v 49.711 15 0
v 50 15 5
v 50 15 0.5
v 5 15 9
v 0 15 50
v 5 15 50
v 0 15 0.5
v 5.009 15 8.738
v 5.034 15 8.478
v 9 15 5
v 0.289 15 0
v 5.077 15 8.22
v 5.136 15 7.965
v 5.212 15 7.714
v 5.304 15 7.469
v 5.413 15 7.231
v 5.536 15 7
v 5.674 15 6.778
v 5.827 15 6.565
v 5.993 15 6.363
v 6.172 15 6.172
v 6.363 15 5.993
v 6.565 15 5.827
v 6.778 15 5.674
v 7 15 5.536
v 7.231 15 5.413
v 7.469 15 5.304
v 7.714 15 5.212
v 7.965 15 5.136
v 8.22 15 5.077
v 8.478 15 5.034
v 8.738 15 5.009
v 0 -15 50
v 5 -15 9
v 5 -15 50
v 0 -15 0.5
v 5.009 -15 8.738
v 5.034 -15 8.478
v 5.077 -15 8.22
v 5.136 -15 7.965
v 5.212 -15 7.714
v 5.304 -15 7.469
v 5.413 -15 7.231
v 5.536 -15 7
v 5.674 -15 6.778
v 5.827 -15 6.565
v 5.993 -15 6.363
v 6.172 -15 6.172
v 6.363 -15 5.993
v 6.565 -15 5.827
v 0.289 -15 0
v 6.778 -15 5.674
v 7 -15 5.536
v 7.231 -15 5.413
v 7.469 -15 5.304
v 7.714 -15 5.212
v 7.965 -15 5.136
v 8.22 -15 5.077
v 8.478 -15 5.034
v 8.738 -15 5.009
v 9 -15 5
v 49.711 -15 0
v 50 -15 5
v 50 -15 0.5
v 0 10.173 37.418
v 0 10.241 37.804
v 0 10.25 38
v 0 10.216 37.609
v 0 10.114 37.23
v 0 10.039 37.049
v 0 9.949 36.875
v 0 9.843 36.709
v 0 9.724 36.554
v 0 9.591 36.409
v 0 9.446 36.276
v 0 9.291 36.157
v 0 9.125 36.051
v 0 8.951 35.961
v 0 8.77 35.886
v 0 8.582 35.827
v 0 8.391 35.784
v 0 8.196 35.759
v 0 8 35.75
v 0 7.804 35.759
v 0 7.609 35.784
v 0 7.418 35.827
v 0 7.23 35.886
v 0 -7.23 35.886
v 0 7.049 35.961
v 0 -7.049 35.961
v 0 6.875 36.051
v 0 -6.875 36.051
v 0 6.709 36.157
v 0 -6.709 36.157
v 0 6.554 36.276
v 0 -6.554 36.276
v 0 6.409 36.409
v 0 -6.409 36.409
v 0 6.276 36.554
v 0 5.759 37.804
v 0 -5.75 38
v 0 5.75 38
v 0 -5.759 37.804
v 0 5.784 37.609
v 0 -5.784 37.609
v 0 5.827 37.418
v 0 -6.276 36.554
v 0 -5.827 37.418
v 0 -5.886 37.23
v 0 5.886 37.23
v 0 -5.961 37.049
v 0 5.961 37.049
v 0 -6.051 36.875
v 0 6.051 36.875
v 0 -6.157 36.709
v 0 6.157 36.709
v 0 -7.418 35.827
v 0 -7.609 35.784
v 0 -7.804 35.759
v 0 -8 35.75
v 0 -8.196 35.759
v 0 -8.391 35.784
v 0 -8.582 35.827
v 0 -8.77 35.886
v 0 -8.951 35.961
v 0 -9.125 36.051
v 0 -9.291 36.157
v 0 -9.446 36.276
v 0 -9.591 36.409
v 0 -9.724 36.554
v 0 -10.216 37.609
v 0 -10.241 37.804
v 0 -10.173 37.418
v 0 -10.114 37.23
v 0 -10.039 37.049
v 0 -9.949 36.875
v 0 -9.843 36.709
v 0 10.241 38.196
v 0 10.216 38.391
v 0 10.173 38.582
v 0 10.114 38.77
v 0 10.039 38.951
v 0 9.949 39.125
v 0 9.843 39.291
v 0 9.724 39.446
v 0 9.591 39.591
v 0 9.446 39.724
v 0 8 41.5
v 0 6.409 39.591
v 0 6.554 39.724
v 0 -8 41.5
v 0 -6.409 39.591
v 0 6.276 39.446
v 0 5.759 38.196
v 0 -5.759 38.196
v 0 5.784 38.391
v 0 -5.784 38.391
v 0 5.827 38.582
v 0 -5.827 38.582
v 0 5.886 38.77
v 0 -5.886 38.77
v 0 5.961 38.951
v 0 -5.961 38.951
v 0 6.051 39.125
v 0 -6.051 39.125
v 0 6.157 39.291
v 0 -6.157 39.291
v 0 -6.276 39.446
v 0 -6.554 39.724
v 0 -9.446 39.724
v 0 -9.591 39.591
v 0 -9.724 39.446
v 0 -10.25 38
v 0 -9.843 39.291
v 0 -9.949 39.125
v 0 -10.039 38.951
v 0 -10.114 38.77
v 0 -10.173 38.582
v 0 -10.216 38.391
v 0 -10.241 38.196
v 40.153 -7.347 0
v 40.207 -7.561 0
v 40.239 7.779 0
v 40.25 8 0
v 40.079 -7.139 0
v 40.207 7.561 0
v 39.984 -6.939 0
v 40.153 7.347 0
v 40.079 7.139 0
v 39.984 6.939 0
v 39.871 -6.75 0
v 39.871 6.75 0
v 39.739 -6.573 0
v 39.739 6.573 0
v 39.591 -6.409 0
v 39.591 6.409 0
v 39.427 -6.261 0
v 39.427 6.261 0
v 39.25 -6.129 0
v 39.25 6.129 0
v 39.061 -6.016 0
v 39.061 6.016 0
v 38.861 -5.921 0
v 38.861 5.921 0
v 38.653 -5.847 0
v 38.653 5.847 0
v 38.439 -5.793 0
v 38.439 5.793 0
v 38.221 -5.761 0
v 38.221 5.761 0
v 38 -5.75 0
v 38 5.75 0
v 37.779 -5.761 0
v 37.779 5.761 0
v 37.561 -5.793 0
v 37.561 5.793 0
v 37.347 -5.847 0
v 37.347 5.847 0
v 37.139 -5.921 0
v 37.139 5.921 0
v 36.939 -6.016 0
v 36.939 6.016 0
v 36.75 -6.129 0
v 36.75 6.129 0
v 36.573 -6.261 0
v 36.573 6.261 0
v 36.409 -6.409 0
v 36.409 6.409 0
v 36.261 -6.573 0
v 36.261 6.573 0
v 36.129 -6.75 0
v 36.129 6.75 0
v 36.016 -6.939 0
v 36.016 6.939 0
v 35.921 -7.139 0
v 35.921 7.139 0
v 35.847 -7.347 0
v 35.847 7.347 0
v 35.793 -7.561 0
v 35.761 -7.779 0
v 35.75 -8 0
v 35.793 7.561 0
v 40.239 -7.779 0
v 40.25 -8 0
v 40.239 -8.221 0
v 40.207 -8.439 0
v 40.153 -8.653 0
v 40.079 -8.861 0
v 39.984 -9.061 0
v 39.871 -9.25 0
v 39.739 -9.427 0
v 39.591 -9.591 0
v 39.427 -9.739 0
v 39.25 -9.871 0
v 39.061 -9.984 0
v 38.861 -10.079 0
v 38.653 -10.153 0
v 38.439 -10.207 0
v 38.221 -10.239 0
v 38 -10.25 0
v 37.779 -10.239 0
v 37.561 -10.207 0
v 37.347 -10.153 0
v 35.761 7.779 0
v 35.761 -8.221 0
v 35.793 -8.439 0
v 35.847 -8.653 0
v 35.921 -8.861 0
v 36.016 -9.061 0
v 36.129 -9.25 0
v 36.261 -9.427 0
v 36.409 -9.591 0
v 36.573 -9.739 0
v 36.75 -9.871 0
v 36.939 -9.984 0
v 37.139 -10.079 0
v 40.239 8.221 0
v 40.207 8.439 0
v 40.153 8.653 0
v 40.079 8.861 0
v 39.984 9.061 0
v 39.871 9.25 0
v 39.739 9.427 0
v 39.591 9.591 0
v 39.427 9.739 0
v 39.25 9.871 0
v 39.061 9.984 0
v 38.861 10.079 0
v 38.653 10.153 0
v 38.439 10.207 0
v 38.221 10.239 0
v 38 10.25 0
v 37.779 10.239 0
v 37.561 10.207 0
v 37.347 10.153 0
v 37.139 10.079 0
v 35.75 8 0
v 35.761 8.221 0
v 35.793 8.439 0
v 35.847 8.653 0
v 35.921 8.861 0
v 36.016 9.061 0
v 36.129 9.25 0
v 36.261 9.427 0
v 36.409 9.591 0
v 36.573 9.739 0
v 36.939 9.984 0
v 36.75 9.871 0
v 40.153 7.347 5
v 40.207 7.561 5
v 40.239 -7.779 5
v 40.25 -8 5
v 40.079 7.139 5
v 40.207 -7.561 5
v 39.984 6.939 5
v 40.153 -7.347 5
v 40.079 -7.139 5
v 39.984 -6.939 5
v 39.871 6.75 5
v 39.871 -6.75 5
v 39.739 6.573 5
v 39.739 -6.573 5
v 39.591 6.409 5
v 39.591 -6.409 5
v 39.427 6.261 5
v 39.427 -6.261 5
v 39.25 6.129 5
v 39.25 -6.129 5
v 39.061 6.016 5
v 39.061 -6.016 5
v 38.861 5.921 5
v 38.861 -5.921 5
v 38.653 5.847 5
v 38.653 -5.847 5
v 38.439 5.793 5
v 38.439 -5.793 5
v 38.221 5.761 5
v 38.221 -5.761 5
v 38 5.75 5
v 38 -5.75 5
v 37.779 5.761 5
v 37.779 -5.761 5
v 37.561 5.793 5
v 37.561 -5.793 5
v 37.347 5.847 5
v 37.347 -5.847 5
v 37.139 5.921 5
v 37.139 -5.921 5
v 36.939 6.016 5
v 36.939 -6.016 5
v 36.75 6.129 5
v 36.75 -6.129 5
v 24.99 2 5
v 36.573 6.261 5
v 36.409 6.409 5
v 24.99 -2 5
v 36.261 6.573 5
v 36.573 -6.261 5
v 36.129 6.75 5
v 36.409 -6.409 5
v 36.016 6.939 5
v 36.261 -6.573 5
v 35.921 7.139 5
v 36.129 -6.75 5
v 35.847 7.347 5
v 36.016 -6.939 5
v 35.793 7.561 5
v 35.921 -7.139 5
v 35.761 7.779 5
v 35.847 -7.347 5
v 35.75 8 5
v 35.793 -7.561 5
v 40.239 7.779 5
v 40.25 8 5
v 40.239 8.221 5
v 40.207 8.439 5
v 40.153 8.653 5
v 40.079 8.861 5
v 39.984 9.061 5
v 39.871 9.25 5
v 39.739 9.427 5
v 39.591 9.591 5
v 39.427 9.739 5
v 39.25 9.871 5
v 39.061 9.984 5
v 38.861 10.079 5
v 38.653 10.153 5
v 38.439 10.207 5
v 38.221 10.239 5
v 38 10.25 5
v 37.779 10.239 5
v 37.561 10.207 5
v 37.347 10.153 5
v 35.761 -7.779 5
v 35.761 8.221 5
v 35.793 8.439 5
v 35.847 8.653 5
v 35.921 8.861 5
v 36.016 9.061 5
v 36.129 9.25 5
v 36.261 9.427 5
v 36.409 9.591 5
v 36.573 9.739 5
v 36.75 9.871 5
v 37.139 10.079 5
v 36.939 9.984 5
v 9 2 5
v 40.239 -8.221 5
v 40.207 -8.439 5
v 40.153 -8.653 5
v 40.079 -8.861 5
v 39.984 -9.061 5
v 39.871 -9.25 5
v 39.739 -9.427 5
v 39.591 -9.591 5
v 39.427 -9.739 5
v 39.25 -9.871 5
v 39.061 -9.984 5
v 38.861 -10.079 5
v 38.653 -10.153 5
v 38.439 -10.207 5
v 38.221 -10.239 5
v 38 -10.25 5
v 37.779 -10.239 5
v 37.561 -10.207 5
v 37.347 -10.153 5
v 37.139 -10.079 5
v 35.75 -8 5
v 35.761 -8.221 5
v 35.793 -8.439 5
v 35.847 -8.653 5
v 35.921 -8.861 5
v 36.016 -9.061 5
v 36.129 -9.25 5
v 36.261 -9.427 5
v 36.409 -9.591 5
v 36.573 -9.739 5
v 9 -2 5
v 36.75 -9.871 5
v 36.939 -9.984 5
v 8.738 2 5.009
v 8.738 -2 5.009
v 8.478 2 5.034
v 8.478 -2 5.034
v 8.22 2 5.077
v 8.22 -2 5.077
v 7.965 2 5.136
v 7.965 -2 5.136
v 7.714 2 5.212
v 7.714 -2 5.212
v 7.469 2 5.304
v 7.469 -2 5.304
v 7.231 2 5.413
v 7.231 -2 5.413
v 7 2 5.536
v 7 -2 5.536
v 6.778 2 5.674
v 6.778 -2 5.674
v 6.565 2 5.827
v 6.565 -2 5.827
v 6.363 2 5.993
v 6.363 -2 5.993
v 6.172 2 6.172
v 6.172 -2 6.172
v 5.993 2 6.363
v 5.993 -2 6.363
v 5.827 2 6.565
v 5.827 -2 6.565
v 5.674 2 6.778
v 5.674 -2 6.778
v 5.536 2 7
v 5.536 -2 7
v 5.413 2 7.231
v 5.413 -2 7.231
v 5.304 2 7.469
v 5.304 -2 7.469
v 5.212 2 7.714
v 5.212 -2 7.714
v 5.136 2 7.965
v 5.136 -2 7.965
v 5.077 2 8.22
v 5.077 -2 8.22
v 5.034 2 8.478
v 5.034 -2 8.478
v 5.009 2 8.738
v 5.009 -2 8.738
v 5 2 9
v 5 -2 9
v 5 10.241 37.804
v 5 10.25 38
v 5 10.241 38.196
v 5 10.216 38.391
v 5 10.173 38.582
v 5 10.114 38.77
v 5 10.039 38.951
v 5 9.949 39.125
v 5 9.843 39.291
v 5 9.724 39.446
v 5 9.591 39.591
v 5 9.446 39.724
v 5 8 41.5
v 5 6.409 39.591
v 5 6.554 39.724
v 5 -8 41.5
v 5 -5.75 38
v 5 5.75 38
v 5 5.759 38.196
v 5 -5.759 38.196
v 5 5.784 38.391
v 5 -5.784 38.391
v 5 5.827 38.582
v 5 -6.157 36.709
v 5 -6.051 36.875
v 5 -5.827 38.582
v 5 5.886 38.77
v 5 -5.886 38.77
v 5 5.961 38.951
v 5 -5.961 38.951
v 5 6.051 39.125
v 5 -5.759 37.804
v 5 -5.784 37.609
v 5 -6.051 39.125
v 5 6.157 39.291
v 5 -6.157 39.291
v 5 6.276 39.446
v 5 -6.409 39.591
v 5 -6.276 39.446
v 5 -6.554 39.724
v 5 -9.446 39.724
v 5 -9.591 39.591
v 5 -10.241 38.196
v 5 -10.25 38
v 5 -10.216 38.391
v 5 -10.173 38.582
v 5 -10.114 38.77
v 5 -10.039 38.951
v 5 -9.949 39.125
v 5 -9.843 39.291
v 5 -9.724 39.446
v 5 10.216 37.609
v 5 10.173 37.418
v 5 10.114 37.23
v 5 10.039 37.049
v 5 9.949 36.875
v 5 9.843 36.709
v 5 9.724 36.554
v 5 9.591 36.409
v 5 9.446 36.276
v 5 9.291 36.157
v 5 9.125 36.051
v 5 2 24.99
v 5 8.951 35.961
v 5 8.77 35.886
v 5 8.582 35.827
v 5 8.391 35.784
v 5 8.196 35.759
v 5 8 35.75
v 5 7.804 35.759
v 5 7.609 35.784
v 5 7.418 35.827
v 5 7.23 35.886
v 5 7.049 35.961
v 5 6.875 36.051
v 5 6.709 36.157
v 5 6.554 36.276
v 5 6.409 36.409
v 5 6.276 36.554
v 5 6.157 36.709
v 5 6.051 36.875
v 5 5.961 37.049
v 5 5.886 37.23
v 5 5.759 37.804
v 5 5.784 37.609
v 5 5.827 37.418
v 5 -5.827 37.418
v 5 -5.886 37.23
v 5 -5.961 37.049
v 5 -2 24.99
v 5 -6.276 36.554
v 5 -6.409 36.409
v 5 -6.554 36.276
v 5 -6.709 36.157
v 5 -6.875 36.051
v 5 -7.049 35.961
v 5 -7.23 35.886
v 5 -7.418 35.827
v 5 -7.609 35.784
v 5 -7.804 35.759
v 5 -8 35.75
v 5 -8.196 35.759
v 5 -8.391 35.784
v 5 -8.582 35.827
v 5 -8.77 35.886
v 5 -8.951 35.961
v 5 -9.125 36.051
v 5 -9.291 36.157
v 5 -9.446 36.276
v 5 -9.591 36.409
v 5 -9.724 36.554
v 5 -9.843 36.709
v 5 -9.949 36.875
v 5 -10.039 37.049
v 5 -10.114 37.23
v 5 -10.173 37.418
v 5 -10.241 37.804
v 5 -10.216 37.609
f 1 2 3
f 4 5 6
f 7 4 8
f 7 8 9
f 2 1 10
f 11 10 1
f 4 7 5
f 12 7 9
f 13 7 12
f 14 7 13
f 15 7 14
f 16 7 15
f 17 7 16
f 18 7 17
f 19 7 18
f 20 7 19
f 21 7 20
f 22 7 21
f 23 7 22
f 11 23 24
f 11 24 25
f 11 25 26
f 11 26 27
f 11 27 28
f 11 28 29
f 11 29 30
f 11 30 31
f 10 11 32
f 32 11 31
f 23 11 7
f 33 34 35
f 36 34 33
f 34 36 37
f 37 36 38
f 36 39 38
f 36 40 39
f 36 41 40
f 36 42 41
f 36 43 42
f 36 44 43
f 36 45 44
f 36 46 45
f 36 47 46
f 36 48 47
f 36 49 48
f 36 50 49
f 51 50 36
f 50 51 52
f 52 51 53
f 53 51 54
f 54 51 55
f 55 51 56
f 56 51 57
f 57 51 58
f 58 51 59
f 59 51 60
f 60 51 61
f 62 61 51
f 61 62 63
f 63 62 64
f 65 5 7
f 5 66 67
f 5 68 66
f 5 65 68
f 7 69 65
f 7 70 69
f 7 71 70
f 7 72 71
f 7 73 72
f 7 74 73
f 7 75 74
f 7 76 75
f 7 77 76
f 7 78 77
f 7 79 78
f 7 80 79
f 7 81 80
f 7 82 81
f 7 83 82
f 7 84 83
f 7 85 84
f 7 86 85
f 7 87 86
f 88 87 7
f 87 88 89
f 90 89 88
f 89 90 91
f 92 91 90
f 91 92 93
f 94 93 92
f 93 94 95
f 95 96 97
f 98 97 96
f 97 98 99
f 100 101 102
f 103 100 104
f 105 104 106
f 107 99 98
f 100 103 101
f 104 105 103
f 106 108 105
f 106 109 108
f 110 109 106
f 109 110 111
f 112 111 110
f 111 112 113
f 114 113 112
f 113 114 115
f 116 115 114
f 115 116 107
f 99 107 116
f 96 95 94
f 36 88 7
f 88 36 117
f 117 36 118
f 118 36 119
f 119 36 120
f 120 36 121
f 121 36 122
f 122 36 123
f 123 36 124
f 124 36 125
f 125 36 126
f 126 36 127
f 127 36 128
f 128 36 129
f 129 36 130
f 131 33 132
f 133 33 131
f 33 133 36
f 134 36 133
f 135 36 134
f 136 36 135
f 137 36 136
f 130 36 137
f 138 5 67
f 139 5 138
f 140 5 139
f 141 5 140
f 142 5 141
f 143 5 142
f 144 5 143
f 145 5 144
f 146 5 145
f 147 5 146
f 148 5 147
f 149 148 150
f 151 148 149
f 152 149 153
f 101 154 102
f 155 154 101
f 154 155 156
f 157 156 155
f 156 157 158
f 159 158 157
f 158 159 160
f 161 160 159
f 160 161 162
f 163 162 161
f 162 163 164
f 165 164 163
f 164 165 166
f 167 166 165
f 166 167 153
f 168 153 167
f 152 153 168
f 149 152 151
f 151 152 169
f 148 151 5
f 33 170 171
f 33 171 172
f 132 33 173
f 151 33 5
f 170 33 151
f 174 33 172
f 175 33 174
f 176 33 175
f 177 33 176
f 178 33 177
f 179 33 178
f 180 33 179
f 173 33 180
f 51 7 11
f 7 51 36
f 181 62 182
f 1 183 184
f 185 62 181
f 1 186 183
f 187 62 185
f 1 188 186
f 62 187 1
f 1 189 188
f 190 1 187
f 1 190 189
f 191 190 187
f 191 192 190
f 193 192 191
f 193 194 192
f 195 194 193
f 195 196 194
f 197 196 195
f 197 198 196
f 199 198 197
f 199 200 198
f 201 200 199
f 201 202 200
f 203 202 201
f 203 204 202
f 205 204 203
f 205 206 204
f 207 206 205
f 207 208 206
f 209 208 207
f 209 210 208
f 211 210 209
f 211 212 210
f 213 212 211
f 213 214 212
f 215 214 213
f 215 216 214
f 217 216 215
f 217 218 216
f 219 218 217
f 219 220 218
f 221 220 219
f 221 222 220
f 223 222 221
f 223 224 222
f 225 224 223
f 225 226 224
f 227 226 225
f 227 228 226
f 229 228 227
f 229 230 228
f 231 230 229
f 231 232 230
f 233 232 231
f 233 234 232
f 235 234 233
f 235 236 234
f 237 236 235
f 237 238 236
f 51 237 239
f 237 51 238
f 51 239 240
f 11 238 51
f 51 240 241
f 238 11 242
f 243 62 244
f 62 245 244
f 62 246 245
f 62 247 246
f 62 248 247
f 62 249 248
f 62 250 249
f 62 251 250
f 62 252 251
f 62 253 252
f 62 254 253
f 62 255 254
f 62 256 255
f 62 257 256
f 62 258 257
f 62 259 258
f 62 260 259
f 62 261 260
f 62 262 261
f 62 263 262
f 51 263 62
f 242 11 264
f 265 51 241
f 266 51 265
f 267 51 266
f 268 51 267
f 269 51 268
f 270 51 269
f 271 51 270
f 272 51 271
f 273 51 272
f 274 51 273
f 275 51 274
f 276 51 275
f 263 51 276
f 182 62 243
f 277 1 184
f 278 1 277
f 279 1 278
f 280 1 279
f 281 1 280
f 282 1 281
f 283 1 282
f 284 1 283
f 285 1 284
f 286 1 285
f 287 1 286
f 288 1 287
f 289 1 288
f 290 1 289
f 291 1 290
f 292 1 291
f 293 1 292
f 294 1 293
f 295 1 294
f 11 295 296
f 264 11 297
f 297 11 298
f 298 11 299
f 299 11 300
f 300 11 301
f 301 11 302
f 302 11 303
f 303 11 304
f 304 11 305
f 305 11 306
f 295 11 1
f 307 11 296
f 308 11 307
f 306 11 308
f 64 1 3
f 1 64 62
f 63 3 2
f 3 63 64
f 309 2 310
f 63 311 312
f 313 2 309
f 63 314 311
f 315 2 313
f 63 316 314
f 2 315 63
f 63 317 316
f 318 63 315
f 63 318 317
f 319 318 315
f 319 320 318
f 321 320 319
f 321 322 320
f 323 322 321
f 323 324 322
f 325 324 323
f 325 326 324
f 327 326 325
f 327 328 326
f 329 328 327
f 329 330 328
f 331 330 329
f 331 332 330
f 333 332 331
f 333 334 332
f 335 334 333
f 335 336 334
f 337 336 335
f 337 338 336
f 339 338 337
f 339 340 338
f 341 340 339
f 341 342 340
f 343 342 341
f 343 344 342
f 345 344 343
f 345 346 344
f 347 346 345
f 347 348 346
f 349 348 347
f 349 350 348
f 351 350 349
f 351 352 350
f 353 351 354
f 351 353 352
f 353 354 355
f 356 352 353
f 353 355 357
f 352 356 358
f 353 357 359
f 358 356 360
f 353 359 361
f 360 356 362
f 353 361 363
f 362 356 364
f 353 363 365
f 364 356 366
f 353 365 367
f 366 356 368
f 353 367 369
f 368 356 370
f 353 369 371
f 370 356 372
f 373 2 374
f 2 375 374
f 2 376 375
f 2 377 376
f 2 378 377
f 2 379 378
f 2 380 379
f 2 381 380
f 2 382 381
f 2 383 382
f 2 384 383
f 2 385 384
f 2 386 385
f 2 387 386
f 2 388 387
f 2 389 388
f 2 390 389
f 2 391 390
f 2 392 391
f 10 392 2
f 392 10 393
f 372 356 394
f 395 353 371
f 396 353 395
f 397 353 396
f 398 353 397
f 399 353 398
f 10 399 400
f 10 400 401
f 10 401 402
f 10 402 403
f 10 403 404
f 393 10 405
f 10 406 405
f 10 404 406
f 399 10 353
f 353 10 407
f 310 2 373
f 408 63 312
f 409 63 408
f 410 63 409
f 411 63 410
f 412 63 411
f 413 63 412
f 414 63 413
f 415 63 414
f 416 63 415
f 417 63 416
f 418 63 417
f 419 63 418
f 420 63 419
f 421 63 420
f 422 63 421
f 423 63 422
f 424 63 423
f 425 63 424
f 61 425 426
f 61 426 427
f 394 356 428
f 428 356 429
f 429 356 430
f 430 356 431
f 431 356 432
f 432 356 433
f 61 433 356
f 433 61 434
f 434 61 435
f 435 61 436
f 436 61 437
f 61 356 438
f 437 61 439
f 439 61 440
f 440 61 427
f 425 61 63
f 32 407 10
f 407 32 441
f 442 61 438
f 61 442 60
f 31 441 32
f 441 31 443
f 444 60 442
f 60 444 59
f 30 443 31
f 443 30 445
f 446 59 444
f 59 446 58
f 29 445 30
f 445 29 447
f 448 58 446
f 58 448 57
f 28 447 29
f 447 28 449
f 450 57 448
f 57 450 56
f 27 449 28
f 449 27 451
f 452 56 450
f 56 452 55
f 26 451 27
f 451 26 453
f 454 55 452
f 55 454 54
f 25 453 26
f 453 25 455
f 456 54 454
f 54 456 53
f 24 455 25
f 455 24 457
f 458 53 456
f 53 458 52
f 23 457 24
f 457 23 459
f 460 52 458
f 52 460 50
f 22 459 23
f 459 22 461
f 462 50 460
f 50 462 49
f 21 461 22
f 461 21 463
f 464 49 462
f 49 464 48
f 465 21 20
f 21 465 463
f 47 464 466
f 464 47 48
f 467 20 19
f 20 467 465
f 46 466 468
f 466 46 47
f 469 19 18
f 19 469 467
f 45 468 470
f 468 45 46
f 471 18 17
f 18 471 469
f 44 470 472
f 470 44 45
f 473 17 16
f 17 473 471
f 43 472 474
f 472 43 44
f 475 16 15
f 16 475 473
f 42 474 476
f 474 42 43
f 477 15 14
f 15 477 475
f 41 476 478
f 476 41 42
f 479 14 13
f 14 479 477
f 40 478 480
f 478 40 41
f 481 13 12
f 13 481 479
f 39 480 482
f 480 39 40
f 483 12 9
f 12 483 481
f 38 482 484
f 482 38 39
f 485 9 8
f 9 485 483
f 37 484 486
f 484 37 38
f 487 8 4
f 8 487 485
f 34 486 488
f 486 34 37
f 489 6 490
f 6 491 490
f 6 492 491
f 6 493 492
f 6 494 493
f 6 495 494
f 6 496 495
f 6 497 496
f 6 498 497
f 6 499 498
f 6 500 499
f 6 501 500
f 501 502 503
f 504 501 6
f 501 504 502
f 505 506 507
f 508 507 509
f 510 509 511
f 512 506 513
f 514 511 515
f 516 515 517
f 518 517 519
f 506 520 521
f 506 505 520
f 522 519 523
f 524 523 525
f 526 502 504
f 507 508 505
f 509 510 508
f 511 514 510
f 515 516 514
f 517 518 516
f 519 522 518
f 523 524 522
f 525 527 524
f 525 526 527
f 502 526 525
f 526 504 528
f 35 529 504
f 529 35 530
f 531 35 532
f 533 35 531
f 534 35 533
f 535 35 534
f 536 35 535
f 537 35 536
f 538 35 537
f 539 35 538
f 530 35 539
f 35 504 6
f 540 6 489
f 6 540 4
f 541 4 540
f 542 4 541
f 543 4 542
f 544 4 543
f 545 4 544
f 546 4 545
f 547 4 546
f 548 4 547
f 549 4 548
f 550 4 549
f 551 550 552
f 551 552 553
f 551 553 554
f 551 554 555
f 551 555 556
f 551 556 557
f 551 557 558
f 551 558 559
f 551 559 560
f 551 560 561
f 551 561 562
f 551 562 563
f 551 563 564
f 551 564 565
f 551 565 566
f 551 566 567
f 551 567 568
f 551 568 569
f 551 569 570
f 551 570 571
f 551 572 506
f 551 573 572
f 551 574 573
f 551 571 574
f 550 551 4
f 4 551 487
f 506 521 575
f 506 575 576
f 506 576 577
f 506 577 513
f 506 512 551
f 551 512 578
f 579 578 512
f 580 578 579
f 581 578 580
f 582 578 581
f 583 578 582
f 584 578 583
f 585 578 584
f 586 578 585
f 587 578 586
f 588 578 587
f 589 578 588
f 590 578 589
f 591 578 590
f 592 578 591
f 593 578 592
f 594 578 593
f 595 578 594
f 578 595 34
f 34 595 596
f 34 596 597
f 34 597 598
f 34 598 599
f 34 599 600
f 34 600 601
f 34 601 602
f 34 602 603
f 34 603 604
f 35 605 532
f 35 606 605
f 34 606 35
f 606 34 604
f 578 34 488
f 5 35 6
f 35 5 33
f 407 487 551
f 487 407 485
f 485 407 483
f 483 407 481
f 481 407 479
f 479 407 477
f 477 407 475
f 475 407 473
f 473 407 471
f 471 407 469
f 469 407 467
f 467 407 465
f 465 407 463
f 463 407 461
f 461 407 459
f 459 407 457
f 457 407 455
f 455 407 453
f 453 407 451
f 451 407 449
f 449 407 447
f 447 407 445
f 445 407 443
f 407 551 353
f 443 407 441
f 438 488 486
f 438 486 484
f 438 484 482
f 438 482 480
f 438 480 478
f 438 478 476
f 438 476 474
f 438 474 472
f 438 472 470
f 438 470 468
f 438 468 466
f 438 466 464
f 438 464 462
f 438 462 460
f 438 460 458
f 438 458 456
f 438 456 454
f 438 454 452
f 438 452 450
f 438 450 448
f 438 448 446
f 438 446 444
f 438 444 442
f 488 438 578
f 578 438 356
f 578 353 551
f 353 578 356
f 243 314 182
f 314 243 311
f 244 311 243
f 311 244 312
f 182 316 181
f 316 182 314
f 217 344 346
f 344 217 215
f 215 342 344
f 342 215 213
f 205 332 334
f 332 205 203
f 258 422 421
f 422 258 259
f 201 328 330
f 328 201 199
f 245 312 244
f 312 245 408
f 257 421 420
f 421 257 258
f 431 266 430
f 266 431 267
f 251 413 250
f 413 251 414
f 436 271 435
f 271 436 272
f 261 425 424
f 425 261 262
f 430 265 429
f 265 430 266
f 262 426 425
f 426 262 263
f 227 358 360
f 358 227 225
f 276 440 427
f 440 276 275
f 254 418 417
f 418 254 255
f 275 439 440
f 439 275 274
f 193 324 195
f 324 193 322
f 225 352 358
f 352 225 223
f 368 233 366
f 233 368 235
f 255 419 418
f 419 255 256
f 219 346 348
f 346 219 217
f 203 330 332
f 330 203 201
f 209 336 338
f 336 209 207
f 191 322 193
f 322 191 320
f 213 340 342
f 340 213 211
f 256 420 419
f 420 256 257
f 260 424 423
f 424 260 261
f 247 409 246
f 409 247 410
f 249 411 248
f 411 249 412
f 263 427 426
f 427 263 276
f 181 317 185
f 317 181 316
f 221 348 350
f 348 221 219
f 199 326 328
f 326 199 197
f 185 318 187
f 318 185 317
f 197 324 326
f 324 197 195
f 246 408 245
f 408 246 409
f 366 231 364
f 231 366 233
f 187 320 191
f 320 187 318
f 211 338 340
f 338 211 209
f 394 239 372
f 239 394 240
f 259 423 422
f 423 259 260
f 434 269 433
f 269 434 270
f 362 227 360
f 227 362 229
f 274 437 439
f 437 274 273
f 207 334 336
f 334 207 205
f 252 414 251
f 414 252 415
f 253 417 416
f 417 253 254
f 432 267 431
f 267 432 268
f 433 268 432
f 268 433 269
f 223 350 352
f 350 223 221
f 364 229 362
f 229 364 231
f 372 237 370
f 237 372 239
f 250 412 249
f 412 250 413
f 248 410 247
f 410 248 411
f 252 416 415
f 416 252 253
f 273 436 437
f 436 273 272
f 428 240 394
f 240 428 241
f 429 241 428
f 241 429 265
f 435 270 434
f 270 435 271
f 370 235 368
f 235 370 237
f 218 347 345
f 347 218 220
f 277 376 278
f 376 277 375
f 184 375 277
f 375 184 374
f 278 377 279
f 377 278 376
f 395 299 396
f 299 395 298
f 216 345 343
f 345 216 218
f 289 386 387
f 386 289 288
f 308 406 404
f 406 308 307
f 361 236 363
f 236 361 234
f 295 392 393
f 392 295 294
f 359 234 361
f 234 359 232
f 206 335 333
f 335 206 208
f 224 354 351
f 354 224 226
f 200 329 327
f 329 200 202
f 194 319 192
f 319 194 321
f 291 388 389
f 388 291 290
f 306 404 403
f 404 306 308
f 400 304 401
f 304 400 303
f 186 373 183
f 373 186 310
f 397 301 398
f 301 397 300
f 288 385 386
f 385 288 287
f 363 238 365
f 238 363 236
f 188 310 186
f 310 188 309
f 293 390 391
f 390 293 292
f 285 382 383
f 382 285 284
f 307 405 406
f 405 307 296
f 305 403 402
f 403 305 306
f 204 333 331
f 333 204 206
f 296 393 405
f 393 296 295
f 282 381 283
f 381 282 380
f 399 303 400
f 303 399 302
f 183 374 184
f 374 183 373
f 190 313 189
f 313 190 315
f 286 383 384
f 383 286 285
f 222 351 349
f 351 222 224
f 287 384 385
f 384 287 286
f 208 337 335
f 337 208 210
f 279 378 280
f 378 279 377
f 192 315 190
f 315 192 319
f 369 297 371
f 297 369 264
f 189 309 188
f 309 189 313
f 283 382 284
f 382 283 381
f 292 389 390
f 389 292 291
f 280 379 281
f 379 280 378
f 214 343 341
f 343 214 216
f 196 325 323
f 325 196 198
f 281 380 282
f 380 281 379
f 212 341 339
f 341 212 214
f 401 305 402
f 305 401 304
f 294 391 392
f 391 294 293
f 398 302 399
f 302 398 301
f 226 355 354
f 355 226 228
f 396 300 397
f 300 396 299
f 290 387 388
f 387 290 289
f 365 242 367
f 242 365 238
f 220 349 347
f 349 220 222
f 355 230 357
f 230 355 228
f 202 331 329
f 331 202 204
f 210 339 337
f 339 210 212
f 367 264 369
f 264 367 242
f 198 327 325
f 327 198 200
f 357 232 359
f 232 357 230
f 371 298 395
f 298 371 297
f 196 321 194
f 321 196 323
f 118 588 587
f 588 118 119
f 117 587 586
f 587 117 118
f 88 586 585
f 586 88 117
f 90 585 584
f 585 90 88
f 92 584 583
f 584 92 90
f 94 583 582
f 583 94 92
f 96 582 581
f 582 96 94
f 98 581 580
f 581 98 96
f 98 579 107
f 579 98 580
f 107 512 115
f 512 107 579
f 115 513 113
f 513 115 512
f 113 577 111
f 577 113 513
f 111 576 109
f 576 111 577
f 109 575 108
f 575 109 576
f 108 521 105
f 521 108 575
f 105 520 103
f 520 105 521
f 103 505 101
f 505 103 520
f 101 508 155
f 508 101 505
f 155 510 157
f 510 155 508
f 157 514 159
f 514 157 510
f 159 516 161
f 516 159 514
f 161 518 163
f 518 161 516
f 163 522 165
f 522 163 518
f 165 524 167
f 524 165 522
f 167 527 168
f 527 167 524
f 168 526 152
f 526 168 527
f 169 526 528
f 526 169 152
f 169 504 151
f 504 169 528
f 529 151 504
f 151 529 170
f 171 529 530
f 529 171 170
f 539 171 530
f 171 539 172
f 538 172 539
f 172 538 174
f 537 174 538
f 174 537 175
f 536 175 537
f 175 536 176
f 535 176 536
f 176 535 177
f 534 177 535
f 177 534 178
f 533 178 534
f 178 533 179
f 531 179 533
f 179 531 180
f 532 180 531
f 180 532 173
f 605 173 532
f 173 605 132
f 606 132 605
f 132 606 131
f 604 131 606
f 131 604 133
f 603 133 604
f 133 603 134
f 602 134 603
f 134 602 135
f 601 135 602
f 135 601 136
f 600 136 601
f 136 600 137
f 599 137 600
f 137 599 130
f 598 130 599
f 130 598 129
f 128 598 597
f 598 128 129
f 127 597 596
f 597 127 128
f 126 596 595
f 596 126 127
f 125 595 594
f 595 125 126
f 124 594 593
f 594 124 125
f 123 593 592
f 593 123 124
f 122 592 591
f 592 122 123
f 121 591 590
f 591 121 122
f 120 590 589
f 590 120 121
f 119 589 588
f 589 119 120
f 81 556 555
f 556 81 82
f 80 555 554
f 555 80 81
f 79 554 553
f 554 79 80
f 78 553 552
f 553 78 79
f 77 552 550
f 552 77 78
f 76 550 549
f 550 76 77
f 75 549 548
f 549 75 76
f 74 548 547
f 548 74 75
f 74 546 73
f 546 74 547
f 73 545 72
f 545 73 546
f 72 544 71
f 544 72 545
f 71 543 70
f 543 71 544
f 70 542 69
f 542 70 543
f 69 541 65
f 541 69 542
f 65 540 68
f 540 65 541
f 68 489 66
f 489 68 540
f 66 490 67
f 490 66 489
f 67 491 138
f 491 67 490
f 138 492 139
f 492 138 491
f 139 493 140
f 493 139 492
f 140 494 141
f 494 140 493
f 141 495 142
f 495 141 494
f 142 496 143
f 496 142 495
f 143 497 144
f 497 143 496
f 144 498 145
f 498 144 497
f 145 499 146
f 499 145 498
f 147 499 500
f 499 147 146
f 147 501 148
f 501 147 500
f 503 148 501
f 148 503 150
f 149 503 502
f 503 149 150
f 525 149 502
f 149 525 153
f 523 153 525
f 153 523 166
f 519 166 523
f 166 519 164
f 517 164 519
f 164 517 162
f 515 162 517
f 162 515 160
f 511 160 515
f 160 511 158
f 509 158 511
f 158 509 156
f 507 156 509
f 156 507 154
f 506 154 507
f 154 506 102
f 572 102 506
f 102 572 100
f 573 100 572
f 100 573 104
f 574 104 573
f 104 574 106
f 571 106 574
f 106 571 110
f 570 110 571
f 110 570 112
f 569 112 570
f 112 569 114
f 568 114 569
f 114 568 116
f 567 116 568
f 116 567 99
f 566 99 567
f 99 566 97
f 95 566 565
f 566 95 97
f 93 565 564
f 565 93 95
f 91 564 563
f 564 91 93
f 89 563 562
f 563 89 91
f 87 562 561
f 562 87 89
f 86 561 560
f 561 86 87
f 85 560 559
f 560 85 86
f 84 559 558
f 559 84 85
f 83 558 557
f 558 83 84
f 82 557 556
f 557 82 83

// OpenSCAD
// TEMPLATE: L bracket — a base leg screwed to a shelf/floor and a vertical leg screwed to a wall/panel, two holes per leg (plain or countersunk), inside-corner fillet, optional centre gusset
// Interfaces: base_holes (vertical, through the base leg) and wall_holes (horizontal, through the vertical leg), both screw_d + clearance.
// Origin at the outer corner: the wall face is x = 0, the bed/shelf face is z = 0, the bracket is centred on y. Base leg along +X, vertical leg up +Z.
// Load path: shelf load on the base -> inside fillet (+ gusset) -> vertical leg -> wall screws. Prints base-down, no supports:
// the vertical-leg holes are teardrops (50° roof) so their ceilings need no bridging.

/* [Interface] */
screw_d = 4.0;           // [2:0.1:10]  screw shank diameter (M4 = 4.0)
clearance = 0.5;         // [0:0.05:1]  added to the hole diameter
hole_spacing = 16;       // [6:1:60]  centre distance between the two holes of a leg (across the width)
hole_inset = 12;         // [5:0.5:40]  hole centre from the free end of each leg

/* [Legs] */
leg_a = 50;              // [20:1:120]  base leg length (along X)
leg_b = 50;              // [20:1:120]  vertical leg height (along Z)
width = 30;              // [12:1:80]
thickness = 5;           // [2.4:0.2:12]
inner_fillet = 4;        // [0:0.5:10]  fillet in the inside corner
bed_chamfer = 0.5;       // [0:0.1:1.5]  60° chamfer on the bed-side profile corners

/* [Reinforcement] */
gusset = true;           // triangular centre gusset in the inside corner
gusset_len = 20;         // [5:1:60]  gusset leg length along each leg
gusset_t = 4;            // [2:0.5:10]  gusset thickness (along Y)

/* [Holes] */
countersink = false;     // 90° countersink on the screw-head side (top of the base, inside of the vertical leg)
cs_d = 9;                // [4:0.5:20]  countersink diameter at the surface
teardrop_angle = 50;     // [45:1:70]  roof angle of the horizontal holes, from horizontal (> 45° prints without support)

/* [Render] */
render_target = "part";  // [part, coupon, assembly]

/* [Hidden] */
$fn = 96;
hole = screw_d + clearance;
t = thickness;
base_hole_x = leg_a - hole_inset;
wall_hole_z = leg_b - hole_inset;
cs_depth = (cs_d - hole) / 2;                      // 90° countersink
chamfer_w = bed_chamfer / tan(60);
edge_margin = width / 2 - hole_spacing / 2 - hole / 2;

assert(edge_margin >= 1.6, "holes too close to the side edges (need 1.6 mm)");
assert(hole_inset - hole / 2 >= 1.6, "hole_inset too small for the free end wall");
assert(base_hole_x - hole / 2 > t + inner_fillet + (gusset ? gusset_len : 0), "base holes overlap the corner fillet / gusset");
assert(wall_hole_z - hole / 2 > t + inner_fillet + (gusset ? gusset_len : 0), "wall holes overlap the corner fillet / gusset");
assert(!gusset || hole_spacing / 2 - hole / 2 - gusset_t / 2 >= 1.6, "gusset too close to the holes");
assert(!countersink || cs_depth < t - 1.2, "countersink deeper than the leg allows");
assert(t >= 2.4, "legs thinner than 2.4 mm will not hold screws");
echo(hole = hole, base_holes = [[base_hole_x, -hole_spacing / 2], [base_hole_x, hole_spacing / 2]],
     wall_holes = [[-hole_spacing / 2, wall_hole_z], [hole_spacing / 2, wall_hole_z]], edge_margin = edge_margin);

// L profile in the XZ plane (2D x -> X, 2D y -> Z)
module profile2d() {
    union() {
        polygon([[chamfer_w, 0], [leg_a - chamfer_w, 0], [leg_a, bed_chamfer], [leg_a, t], [t, t], [t, leg_b], [0, leg_b], [0, bed_chamfer]]);
        if (inner_fillet > 0) translate([t, t]) difference() { square([inner_fillet, inner_fillet]); translate([inner_fillet, inner_fillet]) circle(r = inner_fillet); }
    }
}

module teardrop2d(d, ang, n = 56) {
    // circle of diameter d with a pointed roof whose faces are `ang` degrees from horizontal (apex on +Y)
    r = d / 2;
    sweep = 360 - 2 * (90 - ang);
    polygon(concat([for (i = [0 : n]) let(a = ang - i * sweep / n) [r * cos(a), r * sin(a)]], [[0, r / sin(90 - ang)]]));
}

module body() {
    rotate([90, 0, 0]) linear_extrude(height = width, center = true) profile2d();
    if (gusset) rotate([90, 0, 0]) linear_extrude(height = gusset_t, center = true)
        polygon([[t - 0.01, t - 0.01], [t + gusset_len, t - 0.01], [t - 0.01, t + gusset_len]]);
}

module base_holes() {
    for (s = [-1, 1]) translate([base_hole_x, s * hole_spacing / 2, 0]) {
        translate([0, 0, -1]) cylinder(d = hole, h = t + 2, $fn = 64);
        if (countersink) translate([0, 0, t - cs_depth]) cylinder(d1 = hole, d2 = cs_d + 2, h = cs_depth + 1, $fn = 64);
    }
}

module wall_holes() {
    // horizontal along X, teardrop apex up (+Z); countersink on the inside face (x = t)
    for (s = [-1, 1]) translate([0, s * hole_spacing / 2, wall_hole_z]) {
        translate([-1, 0, 0]) rotate([90, 0, 90]) linear_extrude(height = t + 2) teardrop2d(hole, teardrop_angle);
        if (countersink) translate([t - cs_depth, 0, 0]) rotate([0, 90, 0]) cylinder(d1 = hole, d2 = cs_d + 2, h = cs_depth + 1, $fn = 64);
    }
}

module part() { difference() { body(); base_holes(); wall_holes(); } }

module coupon() {
    // hole ladder: a strip with three vertical holes at clearance -0.2 / 0 / +0.2 and three teardrop holes (printed standing) to test the horizontal-hole fit
    difference() {
        union() {
            translate([-25, -8, 0]) cube([50, 16, t]);
            for (i = [-1, 0, 1]) translate([i * 15, 8 - 3, t]) linear_extrude(0.6) text(str(i * 0.2), size = 2.6, halign = "center", $fn = 16);
        }
        for (i = [-1, 0, 1]) translate([i * 15, -2, -1]) cylinder(d = hole + i * 0.2, h = t + 2, $fn = 64);
    }
    translate([-25, -32, 0]) difference() {
        cube([50, t, 14]);
        for (i = [-1, 0, 1]) translate([25 + i * 15, -1, 7]) rotate([-90, 0, 0]) rotate([0, 0, 180]) linear_extrude(height = t + 2) teardrop2d(hole + i * 0.2, teardrop_angle);
    }
    translate([-25, -32 + t - 0.01, 0]) cube([50, 8 - (-32 + t) + 0.02, 1.2]);   // bridge so the coupon is one piece
}

module assembly() {
    part();
    %translate([-6, -width / 2 - 10, -6]) cube([6, width + 20, leg_b + 16]);      // wall
    %translate([-6, -width / 2 - 10, -6]) cube([leg_a + 16, width + 20, 6]);      // shelf / floor
    for (s = [-1, 1]) {
        %translate([base_hole_x, s * hole_spacing / 2, -8]) cylinder(d = screw_d, h = t + 8 + 4);
        %translate([-12, s * hole_spacing / 2, wall_hole_z]) rotate([0, 90, 0]) cylinder(d = screw_d, h = 12 + t + 4);
    }
}

if (render_target == "part") part();
else if (render_target == "coupon") coupon();
else assembly();
